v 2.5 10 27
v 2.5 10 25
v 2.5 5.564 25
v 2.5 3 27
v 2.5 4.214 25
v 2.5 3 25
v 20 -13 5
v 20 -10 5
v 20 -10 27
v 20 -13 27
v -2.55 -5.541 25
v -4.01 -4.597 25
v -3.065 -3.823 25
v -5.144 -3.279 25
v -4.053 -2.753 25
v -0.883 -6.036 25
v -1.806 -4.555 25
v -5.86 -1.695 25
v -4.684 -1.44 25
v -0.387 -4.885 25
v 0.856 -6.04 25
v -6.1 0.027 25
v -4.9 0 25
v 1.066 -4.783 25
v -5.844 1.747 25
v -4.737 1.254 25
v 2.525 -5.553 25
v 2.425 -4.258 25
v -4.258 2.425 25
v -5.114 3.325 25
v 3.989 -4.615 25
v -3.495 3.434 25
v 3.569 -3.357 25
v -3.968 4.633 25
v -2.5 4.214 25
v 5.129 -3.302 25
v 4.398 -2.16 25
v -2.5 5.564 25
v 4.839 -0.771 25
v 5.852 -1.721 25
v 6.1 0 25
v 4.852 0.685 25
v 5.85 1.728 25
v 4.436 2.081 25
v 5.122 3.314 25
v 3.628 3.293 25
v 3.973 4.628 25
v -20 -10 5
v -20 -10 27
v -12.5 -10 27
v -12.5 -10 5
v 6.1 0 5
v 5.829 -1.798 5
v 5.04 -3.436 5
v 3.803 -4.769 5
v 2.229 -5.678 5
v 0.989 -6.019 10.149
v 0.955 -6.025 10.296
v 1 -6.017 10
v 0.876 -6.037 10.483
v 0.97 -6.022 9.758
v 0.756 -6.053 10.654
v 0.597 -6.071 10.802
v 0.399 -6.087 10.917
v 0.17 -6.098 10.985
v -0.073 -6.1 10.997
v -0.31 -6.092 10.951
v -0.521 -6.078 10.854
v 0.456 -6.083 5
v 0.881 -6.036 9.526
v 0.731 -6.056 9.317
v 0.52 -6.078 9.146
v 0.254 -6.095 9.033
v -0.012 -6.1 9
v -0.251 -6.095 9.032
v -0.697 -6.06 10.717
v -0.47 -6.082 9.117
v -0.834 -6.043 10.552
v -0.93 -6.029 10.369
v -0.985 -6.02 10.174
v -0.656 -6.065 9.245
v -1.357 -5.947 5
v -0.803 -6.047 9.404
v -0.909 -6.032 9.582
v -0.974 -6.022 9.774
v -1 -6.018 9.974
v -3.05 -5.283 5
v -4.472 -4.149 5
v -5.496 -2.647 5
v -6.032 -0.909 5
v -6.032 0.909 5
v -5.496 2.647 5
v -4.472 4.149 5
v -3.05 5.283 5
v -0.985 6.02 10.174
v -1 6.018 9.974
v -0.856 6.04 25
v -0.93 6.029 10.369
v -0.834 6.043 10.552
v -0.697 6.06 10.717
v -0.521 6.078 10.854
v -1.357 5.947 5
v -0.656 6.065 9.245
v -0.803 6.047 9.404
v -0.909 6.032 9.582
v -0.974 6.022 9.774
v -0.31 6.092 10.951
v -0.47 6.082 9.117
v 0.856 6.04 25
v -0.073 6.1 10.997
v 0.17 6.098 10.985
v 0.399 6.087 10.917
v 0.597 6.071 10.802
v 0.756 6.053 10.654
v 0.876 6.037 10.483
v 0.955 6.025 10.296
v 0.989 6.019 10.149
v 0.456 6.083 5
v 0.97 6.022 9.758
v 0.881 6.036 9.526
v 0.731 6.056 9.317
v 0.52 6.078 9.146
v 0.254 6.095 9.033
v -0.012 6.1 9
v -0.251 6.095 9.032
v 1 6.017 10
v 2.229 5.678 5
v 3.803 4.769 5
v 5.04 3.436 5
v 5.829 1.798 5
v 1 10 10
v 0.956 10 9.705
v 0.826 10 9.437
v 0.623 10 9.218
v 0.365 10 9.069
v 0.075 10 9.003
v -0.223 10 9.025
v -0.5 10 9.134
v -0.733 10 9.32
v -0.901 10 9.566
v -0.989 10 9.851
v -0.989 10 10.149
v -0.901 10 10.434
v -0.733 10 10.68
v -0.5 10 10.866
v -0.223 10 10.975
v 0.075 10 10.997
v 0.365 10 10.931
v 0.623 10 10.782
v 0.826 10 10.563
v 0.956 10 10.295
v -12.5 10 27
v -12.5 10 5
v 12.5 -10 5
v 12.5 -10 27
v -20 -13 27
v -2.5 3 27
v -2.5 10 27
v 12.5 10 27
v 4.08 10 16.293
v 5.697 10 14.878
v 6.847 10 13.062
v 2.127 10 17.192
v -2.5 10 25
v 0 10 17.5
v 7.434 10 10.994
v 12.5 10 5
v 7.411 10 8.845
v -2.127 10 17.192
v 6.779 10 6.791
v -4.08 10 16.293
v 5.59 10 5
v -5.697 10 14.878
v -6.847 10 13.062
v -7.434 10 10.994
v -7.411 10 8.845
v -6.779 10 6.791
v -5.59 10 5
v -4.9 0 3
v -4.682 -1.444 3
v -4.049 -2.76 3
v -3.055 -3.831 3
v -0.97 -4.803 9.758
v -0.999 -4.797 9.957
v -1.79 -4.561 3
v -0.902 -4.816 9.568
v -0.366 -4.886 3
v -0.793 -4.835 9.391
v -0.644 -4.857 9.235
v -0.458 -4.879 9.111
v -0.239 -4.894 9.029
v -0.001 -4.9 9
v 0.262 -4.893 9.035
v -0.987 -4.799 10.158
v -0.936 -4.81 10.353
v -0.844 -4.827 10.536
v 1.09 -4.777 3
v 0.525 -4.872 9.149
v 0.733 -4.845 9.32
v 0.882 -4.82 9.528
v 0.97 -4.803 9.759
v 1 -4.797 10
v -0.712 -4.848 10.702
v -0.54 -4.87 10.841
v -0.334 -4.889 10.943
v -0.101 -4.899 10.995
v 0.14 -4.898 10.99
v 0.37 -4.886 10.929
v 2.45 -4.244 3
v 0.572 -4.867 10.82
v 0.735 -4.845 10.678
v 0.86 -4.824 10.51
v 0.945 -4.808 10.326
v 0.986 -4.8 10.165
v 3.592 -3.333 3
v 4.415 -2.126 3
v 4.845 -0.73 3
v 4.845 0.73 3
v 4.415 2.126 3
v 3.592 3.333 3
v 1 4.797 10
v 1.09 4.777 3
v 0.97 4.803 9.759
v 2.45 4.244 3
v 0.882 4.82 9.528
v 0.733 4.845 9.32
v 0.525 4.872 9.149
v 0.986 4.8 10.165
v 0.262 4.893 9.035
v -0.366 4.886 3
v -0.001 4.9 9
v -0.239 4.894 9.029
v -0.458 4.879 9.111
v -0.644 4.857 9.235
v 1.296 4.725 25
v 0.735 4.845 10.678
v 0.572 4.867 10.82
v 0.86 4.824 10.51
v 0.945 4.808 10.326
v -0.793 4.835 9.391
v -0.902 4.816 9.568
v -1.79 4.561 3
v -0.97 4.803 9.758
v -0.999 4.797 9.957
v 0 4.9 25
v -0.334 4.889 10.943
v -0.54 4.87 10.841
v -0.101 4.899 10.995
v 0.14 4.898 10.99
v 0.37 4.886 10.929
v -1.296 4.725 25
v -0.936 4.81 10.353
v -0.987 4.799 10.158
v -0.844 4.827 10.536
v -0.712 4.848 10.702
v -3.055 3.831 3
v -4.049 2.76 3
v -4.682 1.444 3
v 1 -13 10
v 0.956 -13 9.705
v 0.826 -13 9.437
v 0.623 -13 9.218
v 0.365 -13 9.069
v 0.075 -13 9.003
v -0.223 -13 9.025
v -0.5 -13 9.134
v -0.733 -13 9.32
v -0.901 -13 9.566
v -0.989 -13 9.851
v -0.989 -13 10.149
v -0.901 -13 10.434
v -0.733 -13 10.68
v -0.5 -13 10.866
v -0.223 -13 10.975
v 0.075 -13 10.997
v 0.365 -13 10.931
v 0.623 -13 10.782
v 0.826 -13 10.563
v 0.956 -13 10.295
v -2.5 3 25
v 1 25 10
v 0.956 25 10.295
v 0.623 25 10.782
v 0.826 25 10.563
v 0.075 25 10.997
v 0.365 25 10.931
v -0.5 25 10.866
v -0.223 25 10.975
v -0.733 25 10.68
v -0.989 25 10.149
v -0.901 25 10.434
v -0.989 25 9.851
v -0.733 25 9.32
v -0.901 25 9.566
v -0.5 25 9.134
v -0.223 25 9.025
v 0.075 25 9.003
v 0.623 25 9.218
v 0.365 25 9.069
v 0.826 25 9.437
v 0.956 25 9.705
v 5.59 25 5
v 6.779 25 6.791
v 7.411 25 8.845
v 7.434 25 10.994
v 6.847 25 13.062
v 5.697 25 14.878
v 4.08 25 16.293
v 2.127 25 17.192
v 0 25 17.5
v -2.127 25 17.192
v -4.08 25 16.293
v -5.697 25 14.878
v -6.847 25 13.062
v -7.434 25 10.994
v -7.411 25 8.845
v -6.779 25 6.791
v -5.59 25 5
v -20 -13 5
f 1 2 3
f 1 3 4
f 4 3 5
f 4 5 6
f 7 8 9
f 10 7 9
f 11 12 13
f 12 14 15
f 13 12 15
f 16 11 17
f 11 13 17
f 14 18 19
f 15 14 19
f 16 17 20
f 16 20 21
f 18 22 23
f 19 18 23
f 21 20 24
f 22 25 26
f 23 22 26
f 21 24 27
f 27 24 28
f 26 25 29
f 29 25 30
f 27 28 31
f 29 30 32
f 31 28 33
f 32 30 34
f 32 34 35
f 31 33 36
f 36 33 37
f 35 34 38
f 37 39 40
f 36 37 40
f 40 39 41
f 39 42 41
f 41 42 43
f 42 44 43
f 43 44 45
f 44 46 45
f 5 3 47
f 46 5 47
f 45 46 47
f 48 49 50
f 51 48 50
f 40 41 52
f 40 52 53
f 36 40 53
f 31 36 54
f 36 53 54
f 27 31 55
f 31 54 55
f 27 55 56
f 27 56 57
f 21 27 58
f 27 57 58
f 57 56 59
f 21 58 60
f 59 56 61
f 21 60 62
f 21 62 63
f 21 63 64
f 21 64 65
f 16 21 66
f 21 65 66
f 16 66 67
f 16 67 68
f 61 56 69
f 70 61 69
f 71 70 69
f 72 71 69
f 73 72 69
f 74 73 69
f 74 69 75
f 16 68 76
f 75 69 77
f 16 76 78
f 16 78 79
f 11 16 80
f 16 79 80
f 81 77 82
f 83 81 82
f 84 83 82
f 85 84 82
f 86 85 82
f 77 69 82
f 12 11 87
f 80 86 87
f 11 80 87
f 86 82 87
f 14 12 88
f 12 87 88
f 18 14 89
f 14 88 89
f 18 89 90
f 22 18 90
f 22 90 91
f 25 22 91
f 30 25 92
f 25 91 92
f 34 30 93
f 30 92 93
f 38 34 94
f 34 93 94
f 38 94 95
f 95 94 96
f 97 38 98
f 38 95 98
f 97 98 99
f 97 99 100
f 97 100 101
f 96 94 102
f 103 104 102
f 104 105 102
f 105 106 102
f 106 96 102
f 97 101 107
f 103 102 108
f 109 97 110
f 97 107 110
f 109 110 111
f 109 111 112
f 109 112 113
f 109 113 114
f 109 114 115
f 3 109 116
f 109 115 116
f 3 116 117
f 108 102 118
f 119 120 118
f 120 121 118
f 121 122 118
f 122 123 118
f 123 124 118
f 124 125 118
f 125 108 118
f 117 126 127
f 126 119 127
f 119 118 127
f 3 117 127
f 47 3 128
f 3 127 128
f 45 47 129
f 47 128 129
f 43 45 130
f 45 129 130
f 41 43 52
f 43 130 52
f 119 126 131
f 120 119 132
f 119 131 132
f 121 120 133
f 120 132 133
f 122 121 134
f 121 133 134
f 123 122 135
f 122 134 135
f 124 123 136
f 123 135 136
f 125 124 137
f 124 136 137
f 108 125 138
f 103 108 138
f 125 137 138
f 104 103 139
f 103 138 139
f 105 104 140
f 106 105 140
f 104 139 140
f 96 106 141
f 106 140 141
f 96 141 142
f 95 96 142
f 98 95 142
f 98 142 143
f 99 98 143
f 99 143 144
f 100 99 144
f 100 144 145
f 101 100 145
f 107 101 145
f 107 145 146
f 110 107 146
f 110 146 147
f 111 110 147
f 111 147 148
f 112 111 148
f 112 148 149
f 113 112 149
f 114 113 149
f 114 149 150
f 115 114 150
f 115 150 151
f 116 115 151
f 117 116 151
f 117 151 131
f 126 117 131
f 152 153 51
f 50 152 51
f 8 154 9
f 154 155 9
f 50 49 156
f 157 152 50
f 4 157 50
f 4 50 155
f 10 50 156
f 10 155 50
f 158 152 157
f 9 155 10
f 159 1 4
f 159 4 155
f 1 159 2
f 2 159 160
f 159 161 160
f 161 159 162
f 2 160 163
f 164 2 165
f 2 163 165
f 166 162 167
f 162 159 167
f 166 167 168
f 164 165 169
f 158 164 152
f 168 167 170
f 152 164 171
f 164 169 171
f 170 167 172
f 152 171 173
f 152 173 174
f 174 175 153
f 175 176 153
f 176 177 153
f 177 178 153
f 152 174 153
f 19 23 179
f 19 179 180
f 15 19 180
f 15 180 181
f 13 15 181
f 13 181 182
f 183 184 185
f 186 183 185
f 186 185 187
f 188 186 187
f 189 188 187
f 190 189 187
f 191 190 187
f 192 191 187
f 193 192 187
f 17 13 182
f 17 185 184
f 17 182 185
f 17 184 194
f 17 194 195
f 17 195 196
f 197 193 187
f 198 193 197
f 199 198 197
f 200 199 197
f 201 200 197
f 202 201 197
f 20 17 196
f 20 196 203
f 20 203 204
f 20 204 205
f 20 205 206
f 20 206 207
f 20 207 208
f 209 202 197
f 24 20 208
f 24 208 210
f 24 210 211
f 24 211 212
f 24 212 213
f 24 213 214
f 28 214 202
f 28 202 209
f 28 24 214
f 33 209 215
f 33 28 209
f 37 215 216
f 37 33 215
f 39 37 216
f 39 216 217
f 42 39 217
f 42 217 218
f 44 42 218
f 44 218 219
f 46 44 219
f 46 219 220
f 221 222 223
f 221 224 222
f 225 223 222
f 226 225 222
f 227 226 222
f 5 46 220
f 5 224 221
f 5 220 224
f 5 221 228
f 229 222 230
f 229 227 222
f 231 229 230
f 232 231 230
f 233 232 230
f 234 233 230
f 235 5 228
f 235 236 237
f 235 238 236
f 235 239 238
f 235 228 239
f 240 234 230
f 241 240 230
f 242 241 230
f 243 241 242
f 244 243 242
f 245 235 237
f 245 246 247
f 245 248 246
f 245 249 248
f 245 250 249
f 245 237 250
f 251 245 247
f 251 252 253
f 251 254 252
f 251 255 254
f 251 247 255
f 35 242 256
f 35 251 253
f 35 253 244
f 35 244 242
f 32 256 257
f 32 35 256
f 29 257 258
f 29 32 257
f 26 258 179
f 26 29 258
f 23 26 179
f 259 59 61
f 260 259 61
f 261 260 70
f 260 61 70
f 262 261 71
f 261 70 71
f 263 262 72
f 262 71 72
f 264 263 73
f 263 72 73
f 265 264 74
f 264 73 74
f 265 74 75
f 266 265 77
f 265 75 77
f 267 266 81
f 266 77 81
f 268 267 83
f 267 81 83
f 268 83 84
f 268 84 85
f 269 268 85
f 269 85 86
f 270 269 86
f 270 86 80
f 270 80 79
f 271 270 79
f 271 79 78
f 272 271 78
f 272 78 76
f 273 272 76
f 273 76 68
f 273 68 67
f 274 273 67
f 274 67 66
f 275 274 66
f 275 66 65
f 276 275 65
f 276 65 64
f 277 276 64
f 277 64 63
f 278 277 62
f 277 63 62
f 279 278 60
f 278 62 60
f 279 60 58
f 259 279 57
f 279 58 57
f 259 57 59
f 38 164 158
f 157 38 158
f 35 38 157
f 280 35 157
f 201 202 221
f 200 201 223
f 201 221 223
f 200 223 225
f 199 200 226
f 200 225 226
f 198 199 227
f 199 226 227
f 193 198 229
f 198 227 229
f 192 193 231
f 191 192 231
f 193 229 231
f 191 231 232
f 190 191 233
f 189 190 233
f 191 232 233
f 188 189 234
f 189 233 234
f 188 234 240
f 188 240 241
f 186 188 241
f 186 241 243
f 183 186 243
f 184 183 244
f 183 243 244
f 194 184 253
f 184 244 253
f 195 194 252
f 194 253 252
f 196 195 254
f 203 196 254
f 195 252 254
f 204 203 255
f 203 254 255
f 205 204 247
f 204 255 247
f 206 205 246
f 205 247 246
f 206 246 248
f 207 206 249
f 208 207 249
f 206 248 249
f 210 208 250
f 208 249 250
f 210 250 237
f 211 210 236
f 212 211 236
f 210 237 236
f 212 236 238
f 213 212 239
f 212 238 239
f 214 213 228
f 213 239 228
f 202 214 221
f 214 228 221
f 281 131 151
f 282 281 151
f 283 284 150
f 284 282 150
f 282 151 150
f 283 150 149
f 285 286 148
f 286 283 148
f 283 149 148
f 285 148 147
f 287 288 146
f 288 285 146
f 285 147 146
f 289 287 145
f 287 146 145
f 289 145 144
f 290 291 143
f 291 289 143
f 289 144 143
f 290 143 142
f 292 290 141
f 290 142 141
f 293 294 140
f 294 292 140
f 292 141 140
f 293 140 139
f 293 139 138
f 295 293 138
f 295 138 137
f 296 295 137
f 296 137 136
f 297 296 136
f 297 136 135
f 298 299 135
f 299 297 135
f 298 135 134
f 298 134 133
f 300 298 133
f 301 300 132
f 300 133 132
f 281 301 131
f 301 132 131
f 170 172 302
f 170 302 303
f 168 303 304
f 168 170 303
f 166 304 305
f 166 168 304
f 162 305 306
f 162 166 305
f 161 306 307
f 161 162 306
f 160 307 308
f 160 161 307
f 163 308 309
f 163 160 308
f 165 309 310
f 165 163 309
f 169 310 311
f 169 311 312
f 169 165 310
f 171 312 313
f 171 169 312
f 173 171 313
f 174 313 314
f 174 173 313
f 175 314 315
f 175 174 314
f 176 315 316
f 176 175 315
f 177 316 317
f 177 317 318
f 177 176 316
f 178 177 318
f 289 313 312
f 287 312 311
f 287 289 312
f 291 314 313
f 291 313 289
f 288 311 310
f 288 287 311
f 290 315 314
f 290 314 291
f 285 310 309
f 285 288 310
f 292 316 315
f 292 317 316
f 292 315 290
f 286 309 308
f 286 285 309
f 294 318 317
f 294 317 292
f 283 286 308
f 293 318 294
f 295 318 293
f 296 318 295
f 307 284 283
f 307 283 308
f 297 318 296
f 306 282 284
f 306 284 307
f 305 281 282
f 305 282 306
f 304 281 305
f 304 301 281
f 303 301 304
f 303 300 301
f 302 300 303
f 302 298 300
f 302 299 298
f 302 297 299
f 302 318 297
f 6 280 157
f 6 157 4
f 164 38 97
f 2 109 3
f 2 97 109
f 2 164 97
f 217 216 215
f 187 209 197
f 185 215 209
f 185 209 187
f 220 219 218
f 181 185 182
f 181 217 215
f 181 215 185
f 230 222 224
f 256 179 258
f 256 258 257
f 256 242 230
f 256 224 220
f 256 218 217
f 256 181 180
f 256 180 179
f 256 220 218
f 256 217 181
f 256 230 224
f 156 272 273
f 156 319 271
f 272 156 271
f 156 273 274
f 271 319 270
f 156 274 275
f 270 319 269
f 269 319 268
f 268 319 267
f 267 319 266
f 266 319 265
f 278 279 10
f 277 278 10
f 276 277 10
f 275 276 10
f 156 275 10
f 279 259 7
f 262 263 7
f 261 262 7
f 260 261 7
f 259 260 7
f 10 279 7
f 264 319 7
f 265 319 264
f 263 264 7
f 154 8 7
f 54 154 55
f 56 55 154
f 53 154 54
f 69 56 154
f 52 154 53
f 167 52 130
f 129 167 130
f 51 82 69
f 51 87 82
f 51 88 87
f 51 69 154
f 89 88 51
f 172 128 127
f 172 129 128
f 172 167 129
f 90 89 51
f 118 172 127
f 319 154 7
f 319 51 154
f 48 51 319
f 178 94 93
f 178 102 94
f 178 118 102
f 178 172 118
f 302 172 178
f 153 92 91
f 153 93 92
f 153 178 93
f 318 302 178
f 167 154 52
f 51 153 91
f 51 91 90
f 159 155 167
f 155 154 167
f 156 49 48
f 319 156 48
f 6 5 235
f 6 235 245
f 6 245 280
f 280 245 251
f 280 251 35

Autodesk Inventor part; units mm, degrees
ref_plane "YZ Plane" through (0, 0, 0) normal (1, 0, 0) x (0, 1, 0)
ref_plane "XZ Plane" through (0, 0, 0) normal (0, 1, 0) x (-1, 0, 0)
ref_plane "XY Plane" through (0, 0, 0) normal (0, 0, 1) x (1, 0, 0)
sketch "Sketch1" plane through (0, 0, 0) normal (0, 0, 1) x (1, 0, 0)
  circle A0 centre (0, 0) radius 6.1
  line L0 (-12.5, -10) -> (12.5, -10)
  line L1 (12.5, -10) -> (12.5, 10)
  line L2 (12.5, 10) -> (-12.5, 10)
  line L3 (-12.5, 10) -> (-12.5, -10)
  line L4 (-12.5, -10) -> (12.5, 10) construction
  line L5 (12.5, -10) -> (-12.5, 10) construction
  dimension "d0" = 12.2
  dimension "d1" = 25
  dimension "d2" = 20
extrude "Extrusion1" add sketch "Sketch1" along normal blind 20
sketch "Sketch2" plane through (-12.5, 10, 0) normal (0, 1, 0) x (1, 0, 0)
  line L0 (0, 0) -> (0, -20) construction
  line L1 (25, -20) -> (0, -20) construction
  line L2 (0, 0) -> (25, -20) construction
  line L3 (0, -20) -> (25, 0) construction
  circle A0 centre (12.5, -10) radius 1
  point P0 (12.5, 0)
  dimension "d5" = 2
extrude "Extrusion2" cut sketch "Sketch2" against normal blind 100
sketch "Sketch3" plane through (-12.5, 10, 0) normal (0, 1, 0) x (1, 0, 0)
  circle A0 centre (12.5, -10) radius 1 projected
  line L0 (25, 0) -> (0, 0) projected
  line L1 (0, 0) -> (0, -20) projected
  line L2 (25, -20) -> (0, -20) projected
  line L3 (25, 0) -> (25, -20) projected
  circle A1 centre (12.5, -10) radius 7.5
  point P0 (12.5, 0)
  dimension "d8" = 15
extrude "Extrusion3" add sketch "Sketch3" along normal blind 15 contours A1
sketch "Sketch4" plane through (-12.5, -10, 0) normal (0, -1, 0) x (1, 0, 0)
  line L0 (32.5, 25) -> (-7.5, 25)
  line L1 (-7.5, 25) -> (-7.5, -5)
  line L2 (-7.5, -5) -> (32.5, -5)
  line L3 (32.5, -5) -> (32.5, 25)
  circle A0 centre (12.5, 10) radius 1 projected
  line L4 (32.5, 25) -> (-7.5, -5) construction
  line L5 (-7.5, 25) -> (32.5, -5) construction
  point P0 (12.5, 0)
  dimension "d11" = 30
  dimension "d12" = 40
extrude "Extrusion4" add sketch "Sketch4" along normal blind 3
thicken "Thicken1" operation add thickness 5 both sides no extend neighbours yes toward (0, 0, 1) faces at (-10.3667, 0, 20)
sketch "Sketch5" plane through (-20, -10, 25) normal (0, 0, 1) x (1, 0, 0)
  line L0 (7.5, 20) -> (7.5, 0) projected
  line L1 (0, -3) -> (40, -3) projected
  line L2 (7.5, 20) -> (17.5, 20)
  line L3 (17.5, 20) -> (17.5, -3)
  line L4 (17.5, -3) -> (7.5, -3)
  line L5 (7.5, -3) -> (7.5, 20)
  line L6 (32.5, 0) -> (32.5, 20) projected
  line L7 (32.5, 20) -> (22.5, 20)
  line L8 (22.5, 20) -> (22.5, -3)
  line L9 (22.5, -3) -> (32.5, -3)
  line L10 (32.5, -3) -> (32.5, 20)
  line L11 (32.5, 0) -> (32.5, 20) projected
  line L12 (32.5, 20) -> (7.5, 20) projected
  line L13 (7.5, 20) -> (7.5, 0) projected
  line L14 (7.5, 0) -> (0, 0) projected
  line L15 (0, 0) -> (0, -3) projected
  line L16 (40, -3) -> (0, -3) projected
  line L17 (40, 0) -> (40, -3) projected
  line L18 (40, 0) -> (32.5, 0) projected
  circle A0 centre (20, 10) radius 6.1 projected
  line L19 (17.5, 13) -> (22.5, 13)
  point P0 (22.5, -3)
  dimension "d17" = 10
  dimension "d18" = 10
  dimension "d28" = 3
extrude "Extrusion5" add sketch "Sketch5" along normal blind 2 contours L2 L3 A0 L1 L5 L0 | L5 L1 L15 L14 | L3 A0 | L7 L6 L10 L1 L8 A0 | L3 A0 L8 L1 | L19 L8 A0 L3 | A0 L8 | L18 L17 L1 L10 picked at (20, 9.9667)
sketch "Sketch6" plane through (20, -10, -5) normal (0, 0, -1) x (-1, 0, 0)
  line L0 (-13.3468, 43.0165) -> (63.7046, 43.0165)
  line L1 (63.7046, 43.0165) -> (63.7046, -16.6019)
  line L2 (63.7046, -16.6019) -> (-13.3468, -16.6019)
  line L3 (-13.3468, -16.6019) -> (-13.3468, 43.0165)
  point P0 (20, 10)
extrude "Extrusion6" cut sketch "Sketch6" against normal blind 10
sketch "Sketch7" plane through (-20, -10, 25) normal (0, 0, -1) x (-1, 0, 0)
  circle A0 centre (-20, 10) radius 4.9
  dimension "d23" = 9.8
extrude "Extrusion7" add sketch "Sketch7" along normal blind 22
sketch "Sketch8" plane through (-12.5, 25, 0) normal (0, 1, 0) x (1, 0, 0)
  circle A0 centre (12.5, -10) radius 1 projected
  point P0 (12.5, 0)
extrude "Extrusion8" cut sketch "Sketch8" against normal blind 100
properties part number "New_hinge_template"
